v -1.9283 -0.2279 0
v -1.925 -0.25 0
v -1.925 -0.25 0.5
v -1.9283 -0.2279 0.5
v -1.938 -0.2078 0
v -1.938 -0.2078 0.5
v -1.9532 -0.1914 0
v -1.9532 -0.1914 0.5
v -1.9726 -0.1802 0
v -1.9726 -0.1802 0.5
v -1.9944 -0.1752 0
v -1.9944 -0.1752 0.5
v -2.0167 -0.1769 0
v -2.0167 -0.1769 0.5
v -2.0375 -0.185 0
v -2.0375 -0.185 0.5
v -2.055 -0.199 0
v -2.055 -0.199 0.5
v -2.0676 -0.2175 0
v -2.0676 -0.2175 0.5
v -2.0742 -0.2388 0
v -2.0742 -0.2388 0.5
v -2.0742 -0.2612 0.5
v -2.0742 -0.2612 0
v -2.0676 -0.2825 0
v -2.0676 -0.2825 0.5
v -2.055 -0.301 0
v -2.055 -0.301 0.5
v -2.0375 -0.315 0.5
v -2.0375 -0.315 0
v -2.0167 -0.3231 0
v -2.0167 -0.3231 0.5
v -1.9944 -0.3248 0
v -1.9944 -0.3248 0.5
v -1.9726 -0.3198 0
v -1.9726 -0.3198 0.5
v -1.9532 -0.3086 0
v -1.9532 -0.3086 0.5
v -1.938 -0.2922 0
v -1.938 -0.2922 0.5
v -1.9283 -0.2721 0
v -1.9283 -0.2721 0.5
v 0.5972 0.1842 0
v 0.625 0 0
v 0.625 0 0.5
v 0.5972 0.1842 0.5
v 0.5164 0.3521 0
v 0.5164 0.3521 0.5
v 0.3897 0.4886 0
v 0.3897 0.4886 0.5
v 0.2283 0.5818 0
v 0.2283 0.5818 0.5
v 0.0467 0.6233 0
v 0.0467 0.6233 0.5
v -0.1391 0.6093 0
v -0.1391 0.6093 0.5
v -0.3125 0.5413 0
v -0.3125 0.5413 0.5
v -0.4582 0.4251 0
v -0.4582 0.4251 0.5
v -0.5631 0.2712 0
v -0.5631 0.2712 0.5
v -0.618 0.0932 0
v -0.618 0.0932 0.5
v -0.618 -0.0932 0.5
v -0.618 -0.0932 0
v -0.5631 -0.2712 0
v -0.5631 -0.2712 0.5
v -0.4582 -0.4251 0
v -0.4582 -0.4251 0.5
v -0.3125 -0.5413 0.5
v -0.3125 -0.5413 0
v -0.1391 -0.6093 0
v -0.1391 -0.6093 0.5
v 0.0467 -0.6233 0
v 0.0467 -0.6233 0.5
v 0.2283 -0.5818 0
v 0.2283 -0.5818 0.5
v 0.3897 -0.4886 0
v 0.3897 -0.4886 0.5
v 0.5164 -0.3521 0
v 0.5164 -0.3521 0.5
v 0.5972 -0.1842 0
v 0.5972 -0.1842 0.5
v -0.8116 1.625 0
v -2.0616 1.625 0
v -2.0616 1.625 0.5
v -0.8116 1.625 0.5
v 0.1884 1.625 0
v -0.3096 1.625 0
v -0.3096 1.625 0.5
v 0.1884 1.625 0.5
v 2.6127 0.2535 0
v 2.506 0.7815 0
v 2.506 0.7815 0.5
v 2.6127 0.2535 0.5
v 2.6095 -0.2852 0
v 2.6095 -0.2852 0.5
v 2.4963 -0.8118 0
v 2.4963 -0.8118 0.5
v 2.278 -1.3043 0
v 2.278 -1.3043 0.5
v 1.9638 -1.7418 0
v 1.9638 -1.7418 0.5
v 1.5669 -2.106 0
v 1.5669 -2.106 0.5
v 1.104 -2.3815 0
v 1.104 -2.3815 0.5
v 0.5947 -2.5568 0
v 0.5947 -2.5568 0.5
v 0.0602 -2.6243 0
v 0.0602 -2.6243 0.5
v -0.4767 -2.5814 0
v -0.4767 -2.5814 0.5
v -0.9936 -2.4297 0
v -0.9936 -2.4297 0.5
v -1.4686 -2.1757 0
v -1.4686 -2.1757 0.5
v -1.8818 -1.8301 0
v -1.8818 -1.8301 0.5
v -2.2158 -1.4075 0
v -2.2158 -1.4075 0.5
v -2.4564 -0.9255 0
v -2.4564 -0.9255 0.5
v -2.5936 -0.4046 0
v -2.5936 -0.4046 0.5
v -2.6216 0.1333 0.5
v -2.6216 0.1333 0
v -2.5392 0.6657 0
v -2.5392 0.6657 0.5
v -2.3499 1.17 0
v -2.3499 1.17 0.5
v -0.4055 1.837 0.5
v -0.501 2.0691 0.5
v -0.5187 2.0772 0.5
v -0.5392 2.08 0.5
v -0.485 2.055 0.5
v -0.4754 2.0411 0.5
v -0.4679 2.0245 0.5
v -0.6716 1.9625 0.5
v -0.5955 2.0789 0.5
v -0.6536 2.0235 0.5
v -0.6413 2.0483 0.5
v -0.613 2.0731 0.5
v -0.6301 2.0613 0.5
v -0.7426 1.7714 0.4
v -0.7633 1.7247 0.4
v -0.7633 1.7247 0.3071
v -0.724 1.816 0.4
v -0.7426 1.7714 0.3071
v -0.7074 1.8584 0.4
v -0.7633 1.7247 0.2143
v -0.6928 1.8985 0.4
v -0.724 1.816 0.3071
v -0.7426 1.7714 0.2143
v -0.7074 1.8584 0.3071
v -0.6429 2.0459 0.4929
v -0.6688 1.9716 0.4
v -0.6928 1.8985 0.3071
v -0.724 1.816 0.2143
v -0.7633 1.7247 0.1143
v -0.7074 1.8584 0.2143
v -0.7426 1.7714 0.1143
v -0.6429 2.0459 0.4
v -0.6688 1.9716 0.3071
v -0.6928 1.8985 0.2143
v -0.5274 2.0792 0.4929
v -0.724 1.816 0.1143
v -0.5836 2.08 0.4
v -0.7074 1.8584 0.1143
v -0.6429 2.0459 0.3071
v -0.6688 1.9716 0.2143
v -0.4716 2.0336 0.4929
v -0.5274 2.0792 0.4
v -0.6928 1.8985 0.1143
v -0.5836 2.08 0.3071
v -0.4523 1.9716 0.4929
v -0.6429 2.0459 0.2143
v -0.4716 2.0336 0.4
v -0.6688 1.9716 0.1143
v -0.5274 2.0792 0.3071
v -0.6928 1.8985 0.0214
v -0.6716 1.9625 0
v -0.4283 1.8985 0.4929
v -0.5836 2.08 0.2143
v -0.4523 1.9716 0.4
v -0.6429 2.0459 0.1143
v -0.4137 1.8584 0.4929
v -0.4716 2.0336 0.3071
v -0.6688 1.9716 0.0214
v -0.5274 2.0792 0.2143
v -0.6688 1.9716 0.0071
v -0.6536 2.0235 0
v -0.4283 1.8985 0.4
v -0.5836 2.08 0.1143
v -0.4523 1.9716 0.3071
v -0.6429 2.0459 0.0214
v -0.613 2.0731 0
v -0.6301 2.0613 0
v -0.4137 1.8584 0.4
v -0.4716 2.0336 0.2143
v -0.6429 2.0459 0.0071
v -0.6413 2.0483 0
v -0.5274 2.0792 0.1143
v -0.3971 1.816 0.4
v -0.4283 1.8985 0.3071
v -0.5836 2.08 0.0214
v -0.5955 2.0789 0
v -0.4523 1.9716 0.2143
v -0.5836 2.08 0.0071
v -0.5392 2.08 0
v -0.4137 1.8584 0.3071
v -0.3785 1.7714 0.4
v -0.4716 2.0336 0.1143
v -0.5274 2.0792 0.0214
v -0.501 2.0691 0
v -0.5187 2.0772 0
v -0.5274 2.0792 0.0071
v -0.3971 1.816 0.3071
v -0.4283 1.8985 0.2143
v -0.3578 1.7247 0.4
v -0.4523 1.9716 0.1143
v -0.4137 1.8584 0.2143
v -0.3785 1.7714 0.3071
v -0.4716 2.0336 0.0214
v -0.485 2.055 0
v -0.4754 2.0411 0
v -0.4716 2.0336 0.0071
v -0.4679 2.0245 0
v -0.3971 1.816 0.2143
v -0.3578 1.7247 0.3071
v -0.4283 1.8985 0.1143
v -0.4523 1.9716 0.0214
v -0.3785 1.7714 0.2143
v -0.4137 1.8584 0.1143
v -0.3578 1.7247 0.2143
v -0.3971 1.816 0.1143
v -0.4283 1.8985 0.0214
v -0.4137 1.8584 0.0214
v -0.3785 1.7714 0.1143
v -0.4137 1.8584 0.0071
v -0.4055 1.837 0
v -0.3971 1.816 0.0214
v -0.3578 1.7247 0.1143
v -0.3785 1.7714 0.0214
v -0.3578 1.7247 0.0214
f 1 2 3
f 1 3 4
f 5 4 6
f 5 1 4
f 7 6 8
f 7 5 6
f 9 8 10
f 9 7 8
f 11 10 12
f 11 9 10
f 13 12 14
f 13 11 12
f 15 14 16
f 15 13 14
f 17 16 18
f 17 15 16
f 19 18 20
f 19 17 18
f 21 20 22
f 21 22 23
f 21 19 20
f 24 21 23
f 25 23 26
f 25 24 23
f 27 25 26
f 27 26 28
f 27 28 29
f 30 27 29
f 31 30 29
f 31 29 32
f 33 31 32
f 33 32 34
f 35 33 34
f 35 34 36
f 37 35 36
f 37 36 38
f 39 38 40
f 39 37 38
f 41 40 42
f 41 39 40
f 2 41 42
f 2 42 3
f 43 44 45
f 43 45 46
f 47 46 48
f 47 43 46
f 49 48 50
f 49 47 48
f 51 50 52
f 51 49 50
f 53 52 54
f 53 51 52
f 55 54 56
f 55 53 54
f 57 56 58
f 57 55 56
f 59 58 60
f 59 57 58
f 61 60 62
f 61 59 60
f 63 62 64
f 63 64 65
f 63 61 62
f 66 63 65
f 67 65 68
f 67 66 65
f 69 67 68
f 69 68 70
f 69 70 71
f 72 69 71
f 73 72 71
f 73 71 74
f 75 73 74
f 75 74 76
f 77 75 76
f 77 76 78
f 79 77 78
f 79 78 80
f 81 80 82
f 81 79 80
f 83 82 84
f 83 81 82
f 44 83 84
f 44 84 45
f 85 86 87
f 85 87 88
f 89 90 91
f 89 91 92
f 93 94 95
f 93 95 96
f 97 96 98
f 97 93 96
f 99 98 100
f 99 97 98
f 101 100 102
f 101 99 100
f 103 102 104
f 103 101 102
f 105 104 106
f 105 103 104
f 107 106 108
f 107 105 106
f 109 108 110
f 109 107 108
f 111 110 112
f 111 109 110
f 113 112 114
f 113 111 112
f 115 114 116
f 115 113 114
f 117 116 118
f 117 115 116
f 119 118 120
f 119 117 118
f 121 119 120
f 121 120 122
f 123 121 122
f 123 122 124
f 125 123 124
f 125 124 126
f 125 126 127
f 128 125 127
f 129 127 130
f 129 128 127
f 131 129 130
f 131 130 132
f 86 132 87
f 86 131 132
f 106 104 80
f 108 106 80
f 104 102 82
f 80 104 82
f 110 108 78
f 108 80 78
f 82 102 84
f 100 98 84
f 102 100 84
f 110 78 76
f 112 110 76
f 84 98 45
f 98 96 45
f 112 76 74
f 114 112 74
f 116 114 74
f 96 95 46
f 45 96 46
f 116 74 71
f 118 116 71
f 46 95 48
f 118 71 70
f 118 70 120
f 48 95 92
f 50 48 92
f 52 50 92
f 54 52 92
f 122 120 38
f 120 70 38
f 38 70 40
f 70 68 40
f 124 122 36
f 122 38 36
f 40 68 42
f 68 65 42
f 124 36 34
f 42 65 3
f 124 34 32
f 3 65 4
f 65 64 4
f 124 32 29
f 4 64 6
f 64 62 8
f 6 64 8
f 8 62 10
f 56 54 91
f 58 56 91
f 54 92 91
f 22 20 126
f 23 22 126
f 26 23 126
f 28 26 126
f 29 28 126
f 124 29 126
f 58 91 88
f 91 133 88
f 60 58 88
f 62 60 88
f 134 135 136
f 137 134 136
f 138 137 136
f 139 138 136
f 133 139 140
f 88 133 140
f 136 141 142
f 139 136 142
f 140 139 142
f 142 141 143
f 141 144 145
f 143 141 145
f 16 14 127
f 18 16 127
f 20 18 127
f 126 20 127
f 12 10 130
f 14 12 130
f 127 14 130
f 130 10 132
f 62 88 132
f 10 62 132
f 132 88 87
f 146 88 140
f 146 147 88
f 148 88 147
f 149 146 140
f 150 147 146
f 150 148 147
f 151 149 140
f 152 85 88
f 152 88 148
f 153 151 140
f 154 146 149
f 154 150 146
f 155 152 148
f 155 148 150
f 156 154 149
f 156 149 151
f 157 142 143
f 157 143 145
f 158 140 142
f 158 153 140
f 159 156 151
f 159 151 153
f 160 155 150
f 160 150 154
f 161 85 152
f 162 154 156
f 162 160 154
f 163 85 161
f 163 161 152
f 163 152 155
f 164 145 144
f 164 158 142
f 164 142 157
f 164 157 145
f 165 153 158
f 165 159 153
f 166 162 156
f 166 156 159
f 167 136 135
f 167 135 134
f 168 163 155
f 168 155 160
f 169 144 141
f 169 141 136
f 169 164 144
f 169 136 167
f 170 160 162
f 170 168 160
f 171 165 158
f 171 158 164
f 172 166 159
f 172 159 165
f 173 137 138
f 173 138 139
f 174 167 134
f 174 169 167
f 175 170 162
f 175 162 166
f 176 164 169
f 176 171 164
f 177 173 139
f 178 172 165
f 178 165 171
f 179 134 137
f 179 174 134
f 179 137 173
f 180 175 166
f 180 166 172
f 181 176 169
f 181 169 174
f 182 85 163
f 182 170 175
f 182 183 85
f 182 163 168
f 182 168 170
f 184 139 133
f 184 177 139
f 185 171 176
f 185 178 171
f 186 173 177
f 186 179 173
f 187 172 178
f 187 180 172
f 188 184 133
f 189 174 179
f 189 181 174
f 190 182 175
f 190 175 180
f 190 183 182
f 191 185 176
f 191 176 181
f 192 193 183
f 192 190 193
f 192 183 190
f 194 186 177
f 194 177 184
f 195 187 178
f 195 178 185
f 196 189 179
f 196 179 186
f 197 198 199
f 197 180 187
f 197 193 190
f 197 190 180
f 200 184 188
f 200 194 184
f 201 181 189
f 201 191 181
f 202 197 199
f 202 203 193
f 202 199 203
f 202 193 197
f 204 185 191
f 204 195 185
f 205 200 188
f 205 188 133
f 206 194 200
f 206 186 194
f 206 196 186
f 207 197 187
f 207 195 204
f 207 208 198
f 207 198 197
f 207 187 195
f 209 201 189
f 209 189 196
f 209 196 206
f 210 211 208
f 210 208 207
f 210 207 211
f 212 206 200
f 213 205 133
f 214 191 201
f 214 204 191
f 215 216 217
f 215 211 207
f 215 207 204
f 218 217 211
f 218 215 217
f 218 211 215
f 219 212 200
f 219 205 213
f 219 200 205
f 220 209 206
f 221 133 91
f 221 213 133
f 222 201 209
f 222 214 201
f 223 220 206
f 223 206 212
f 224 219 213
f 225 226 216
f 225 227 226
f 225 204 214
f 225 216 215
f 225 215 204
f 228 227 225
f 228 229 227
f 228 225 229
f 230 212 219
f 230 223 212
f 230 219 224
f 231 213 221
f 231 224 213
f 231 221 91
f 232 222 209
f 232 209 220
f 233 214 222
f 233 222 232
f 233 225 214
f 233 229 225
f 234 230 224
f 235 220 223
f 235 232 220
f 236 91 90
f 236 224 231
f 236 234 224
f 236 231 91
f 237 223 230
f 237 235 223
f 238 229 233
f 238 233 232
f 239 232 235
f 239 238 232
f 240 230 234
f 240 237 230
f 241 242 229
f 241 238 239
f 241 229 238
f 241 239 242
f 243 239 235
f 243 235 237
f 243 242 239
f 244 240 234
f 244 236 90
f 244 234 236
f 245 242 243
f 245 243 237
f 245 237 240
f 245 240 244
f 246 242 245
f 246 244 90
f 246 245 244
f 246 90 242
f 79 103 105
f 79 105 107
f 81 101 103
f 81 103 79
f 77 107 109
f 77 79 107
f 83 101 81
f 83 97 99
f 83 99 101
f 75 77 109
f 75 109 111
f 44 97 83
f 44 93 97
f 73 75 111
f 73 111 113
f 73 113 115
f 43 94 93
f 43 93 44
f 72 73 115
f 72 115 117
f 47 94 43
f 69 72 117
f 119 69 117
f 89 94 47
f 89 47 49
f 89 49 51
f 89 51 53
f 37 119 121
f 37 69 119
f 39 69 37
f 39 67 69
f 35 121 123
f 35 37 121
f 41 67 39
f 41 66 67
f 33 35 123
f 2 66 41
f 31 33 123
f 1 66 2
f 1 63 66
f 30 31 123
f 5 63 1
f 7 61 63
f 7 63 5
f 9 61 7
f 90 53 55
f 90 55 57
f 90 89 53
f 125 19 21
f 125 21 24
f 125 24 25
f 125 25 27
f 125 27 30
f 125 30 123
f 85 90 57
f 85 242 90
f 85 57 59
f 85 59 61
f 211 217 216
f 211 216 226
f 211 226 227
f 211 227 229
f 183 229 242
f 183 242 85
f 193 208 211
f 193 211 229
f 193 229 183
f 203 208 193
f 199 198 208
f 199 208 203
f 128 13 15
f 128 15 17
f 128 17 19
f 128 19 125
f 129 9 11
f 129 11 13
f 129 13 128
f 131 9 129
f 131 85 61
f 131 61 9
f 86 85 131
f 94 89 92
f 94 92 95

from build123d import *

# Parameters (mm, degrees)
CROQUIS1_R              = 0.625
CROQUIS1_R_2            = 0.075
SALIENTE_EXTRUIR1_DEPTH = 0.5


with BuildPart() as part:
    # Croquis1 → Saliente-Extruir1 (new body)
    with BuildSketch(Plane.XY):
        with BuildLine():
            Line((-2.061552813, 1.625), (-0.811552813, 1.625))
            add(Edge.make_bspline(
                [(-0.811552813, 1.625), (-0.798782356, 1.649959349), (-0.782498238, 1.683090879), (-0.763347126, 1.72442316), (-0.752712149, 1.748064852), (-0.74262377, 1.771178381), (-0.733068825, 1.793754559), (-0.724034006, 1.815784432), (-0.715505878, 1.837259275), (-0.707470863, 1.858170593), (-0.699915302, 1.878510138), (-0.692825255, 1.898269854), (-0.686187231, 1.917442077), (-0.679985615, 1.936018832), (-0.674211779, 1.953994338), (-0.668831938, 1.971356162), (-0.66341026, 1.989782298), (-0.659291042, 2.003761573), (-0.65673809, 2.013593254), (-0.65553735, 2.017655932), (-0.654243192, 2.021674167), (-0.652826724, 2.025662873), (-0.651269039, 2.029644141), (-0.649539563, 2.033642415), (-0.647598658, 2.037685942), (-0.645392531, 2.041805901), (-0.642848792, 2.046034827), (-0.639870281, 2.050402579), (-0.636328384, 2.054928152), (-0.6320578, 2.059604348), (-0.626858125, 2.064372328), (-0.620512998, 2.06908401), (-0.612841423, 2.073466371), (-0.60379299, 2.077092613), (-0.593874768, 2.079431243), (-0.579295505, 2.080347541), (-0.560560129, 2.079632007), (-0.541824754, 2.080347541), (-0.52724549, 2.079431243), (-0.517327269, 2.077092613), (-0.508278836, 2.073466371), (-0.500607261, 2.06908401), (-0.494262134, 2.064372328), (-0.489062459, 2.059604348), (-0.484791875, 2.054928152), (-0.481249978, 2.050402579), (-0.478271466, 2.046034827), (-0.475727728, 2.041805901), (-0.473521601, 2.037685942), (-0.471580696, 2.033642415), (-0.46985122, 2.029644141), (-0.468293535, 2.025662873), (-0.466877067, 2.021674167), (-0.465582909, 2.017655932), (-0.464382169, 2.013593254), (-0.461829216, 2.003761573), (-0.457709999, 1.989782298), (-0.452288321, 1.971356162), (-0.44690848, 1.953994338), (-0.441134644, 1.936018832), (-0.434933028, 1.917442077), (-0.428295003, 1.898269854), (-0.421204957, 1.878510138), (-0.413649396, 1.858170593), (-0.405614381, 1.837259275), (-0.397086252, 1.815784432), (-0.388051434, 1.793754559), (-0.378496489, 1.771178381), (-0.36840811, 1.748064852), (-0.357773133, 1.72442316), (-0.338622021, 1.683090879), (-0.322337903, 1.649959349), (-0.309567446, 1.625)],
                knots=[0, 0, 0, 0, 0.076643471, 0.100907917, 0.124530541, 0.147511341, 0.169850319, 0.191547473, 0.212602804, 0.233016312, 0.252787997, 0.271917859, 0.290405898, 0.308252114, 0.325456506, 0.342019076, 0.357939822, 0.377966124, 0.381853223, 0.38570675, 0.389545591, 0.393392716, 0.39727624, 0.401230769, 0.405299107, 0.409534341, 0.414002283, 0.418784036, 0.423978014, 0.429699889, 0.436077405, 0.443234951, 0.45126173, 0.460161641, 0.469798585, 0.478975881, 0.5, 0.521024119, 0.530201415, 0.539838359, 0.54873827, 0.556765049, 0.563922595, 0.570300111, 0.576021986, 0.581215964, 0.585997717, 0.590465659, 0.594700893, 0.598769231, 0.60272376, 0.606607284, 0.610454409, 0.61429325, 0.618146777, 0.622033876, 0.642060178, 0.657980924, 0.674543494, 0.691747886, 0.709594102, 0.728082141, 0.747212003, 0.766983688, 0.787397196, 0.808452527, 0.830149681, 0.852488659, 0.875469459, 0.899092083, 0.923356529, 1, 1, 1, 1], degree=3))
            Line((-0.309567446, 1.625), (0.188447187, 1.625))
            Line((0.188447187, 1.625), (2.505972628, 0.781489722))
            ThreePointArc((2.505972628, 0.781489722), (-0.476712324, -2.581350491), (-2.061552813, 1.625))
        make_face()
        Circle(CROQUIS1_R, mode=Mode.SUBTRACT)
        with Locations((-2, -0.25)):
            Circle(CROQUIS1_R_2, mode=Mode.SUBTRACT)
    extrude(amount=SALIENTE_EXTRUIR1_DEPTH)


solid = part.part
